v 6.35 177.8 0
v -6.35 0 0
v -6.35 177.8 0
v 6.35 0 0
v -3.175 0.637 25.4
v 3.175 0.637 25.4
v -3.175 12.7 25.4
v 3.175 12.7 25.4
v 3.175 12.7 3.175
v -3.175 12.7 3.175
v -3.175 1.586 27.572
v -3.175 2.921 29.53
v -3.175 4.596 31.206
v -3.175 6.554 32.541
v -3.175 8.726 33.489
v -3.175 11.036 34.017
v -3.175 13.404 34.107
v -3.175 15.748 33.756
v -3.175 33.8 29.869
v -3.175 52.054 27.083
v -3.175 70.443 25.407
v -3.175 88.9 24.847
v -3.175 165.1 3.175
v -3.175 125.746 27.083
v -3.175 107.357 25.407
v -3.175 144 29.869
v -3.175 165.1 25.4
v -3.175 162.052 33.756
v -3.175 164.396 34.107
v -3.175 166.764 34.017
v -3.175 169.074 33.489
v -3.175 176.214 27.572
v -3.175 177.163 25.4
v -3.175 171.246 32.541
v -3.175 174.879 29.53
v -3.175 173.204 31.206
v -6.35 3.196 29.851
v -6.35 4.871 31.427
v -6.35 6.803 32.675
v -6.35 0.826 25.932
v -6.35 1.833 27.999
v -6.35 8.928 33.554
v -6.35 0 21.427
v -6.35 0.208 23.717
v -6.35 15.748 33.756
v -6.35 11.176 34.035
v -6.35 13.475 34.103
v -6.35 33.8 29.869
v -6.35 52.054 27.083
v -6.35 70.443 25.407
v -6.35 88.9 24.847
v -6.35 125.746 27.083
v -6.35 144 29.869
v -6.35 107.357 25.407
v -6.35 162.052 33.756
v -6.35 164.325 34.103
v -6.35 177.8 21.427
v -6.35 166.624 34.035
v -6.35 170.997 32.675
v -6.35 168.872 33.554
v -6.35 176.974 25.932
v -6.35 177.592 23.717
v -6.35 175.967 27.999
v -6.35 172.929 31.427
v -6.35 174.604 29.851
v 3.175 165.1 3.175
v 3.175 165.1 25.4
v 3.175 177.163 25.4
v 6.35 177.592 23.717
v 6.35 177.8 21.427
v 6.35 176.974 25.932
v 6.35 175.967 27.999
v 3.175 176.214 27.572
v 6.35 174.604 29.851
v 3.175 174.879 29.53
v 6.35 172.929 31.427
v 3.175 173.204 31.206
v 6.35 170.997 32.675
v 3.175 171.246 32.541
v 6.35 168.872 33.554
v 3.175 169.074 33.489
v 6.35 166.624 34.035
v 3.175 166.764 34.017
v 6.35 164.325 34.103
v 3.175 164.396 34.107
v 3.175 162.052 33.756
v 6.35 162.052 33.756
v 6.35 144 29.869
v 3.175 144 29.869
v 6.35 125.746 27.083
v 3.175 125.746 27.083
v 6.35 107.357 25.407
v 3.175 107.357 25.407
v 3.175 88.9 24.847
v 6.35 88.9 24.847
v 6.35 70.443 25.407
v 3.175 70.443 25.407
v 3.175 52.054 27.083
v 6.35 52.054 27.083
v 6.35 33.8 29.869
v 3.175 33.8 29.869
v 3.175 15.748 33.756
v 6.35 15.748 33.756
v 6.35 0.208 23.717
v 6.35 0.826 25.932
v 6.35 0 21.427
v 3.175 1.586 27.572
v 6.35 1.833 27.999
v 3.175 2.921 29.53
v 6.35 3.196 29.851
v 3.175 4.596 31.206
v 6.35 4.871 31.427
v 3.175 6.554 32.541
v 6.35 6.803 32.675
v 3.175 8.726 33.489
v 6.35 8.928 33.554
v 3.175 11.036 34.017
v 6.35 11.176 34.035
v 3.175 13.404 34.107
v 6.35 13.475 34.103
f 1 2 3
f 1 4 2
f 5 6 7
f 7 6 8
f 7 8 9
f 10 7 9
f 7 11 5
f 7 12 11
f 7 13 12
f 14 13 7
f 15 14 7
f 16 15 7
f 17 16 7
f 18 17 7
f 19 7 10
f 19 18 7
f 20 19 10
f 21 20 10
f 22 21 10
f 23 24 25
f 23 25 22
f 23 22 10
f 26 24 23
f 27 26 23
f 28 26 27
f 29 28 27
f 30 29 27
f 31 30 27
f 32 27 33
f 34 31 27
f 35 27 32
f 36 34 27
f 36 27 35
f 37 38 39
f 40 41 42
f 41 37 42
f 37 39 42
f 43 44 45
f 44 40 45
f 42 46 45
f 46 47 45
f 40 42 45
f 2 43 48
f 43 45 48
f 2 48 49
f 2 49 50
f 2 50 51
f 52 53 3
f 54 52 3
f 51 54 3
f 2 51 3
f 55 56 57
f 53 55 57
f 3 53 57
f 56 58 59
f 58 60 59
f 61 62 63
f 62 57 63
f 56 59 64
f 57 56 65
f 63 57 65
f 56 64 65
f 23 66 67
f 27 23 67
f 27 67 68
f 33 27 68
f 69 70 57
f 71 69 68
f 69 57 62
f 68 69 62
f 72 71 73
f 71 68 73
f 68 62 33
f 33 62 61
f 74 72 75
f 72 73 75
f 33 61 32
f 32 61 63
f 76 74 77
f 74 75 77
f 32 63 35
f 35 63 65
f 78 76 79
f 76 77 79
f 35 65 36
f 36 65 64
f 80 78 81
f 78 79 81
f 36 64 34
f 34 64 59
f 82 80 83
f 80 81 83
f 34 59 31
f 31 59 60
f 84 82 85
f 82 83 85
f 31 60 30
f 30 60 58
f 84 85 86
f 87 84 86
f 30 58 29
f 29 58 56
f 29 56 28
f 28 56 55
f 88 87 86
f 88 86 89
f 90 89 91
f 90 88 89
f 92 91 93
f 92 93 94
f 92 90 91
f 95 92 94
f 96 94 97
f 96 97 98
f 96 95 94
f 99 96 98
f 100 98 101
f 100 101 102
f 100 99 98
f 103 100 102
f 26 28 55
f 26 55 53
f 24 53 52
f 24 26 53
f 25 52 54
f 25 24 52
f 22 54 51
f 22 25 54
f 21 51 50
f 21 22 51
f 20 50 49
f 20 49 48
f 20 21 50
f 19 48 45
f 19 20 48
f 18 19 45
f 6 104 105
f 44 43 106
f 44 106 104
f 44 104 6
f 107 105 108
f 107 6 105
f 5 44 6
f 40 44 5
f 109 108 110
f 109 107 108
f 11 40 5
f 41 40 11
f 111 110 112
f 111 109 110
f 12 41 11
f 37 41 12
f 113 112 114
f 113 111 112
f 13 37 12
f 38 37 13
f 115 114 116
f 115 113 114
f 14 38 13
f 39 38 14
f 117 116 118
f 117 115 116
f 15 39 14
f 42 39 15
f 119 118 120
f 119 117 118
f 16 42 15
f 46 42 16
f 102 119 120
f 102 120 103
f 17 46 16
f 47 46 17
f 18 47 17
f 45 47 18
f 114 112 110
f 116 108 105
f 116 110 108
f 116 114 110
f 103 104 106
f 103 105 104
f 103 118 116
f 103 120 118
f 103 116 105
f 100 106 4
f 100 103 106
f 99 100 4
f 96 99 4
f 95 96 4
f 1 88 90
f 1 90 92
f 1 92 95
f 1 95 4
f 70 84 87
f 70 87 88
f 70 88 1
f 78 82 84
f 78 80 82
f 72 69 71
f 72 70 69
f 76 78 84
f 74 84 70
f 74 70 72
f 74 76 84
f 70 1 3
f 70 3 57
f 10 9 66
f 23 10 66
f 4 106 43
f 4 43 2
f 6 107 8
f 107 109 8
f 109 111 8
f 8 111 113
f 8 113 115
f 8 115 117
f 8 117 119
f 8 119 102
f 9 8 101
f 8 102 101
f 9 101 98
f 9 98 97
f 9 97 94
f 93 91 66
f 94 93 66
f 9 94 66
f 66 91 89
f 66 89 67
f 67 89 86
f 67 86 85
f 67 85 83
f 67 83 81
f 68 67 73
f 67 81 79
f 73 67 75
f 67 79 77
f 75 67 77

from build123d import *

# Parameters (mm, degrees)
F0_W        = 152.4
F0_H        = 3.175
F1_DEPTH    = 6.35
F2_DEPTH    = 3.175
F3_T1_DEPTH = 86.5404436654
F3_T3_DEPTH = 86.5404436654


# Not quite as in the source:
# - a fillet or chamfer that OpenCascade refuses, or shapes differently, is made with other operations: its cross-section is extruded or revolved along the edge and cut away or added


with BuildPart() as f1:
    # F0 (on Right) → F1 (new body, symmetric)
    with BuildSketch(Plane.YZ):
        with Locations((88.9, 1.5875)):
            Rectangle(F0_W, F0_H)
        Polygon((0, 25.4), (0, 0), (12.7, 0), (12.7, 3.175), (12.7, 25.4), align=None)
        Polygon((165.1, 3.175), (165.1, 0), (177.8, 0), (177.8, 25.4), (165.1, 25.4), align=None)
        with BuildLine():
            Line((0, 38.1), (0, 25.4))
            Line((0, 25.4), (12.7, 25.4))
            Line((12.7, 25.4), (12.7, 3.175))
            Line((12.7, 3.175), (165.1, 3.175))
            Line((165.1, 3.175), (165.1, 25.4))
            Line((165.1, 25.4), (177.8, 25.4))
            Line((177.8, 25.4), (177.8, 38.1))
            ThreePointArc((177.8, 38.1), (88.9, 24.8473031945), (0, 38.1))
        make_face()
    extrude(amount=F1_DEPTH, both=True)

    # F0 (on Right) → F2 (cut, symmetric)
    with BuildSketch(Plane.YZ):
        with BuildLine():
            Line((0, 38.1), (0, 25.4))
            Line((0, 25.4), (12.7, 25.4))
            Line((12.7, 25.4), (12.7, 3.175))
            Line((12.7, 3.175), (165.1, 3.175))
            Line((165.1, 3.175), (165.1, 25.4))
            Line((165.1, 25.4), (177.8, 25.4))
            Line((177.8, 25.4), (177.8, 38.1))
            ThreePointArc((177.8, 38.1), (88.9, 24.8473031945), (0, 38.1))
        make_face()
    extrude(amount=F2_DEPTH, both=True, mode=Mode.SUBTRACT)

    # F3: fillet of radius 12.7 on 4 edges, made by hand

    # F3_s2 → F3_t1 (cut)
    with BuildSketch(Plane.YZ.offset(-48.0327218327)):
        with BuildLine():
            ThreePointArc((0, 21.4269112669), (4.8711942162, 31.4269012669), (15.748, 33.755726944))
            ThreePointArc((15.748, 33.755726944), (7.8448900248, 35.8223397437), (0, 38.1))
            Line((0, 38.1), (0, 21.4269112669))
        make_face()
        with BuildLine():
            ThreePointArc((177.8, 21.4269112669), (172.9288057838, 31.4269012669), (162.052, 33.755726944))
            ThreePointArc((162.052, 33.755726944), (169.9551099752, 35.8223397437), (177.8, 38.1))
            Line((177.8, 38.1), (177.8, 21.4269112669))
        make_face()
    extrude(amount=F3_T1_DEPTH, mode=Mode.SUBTRACT)

    # F3_s4 → F3_t3 (cut)
    with BuildSketch(Plane.YZ.offset(-38.5077218327)):
        with BuildLine():
            ThreePointArc((0, 21.4269112669), (4.8711942162, 31.4269012669), (15.748, 33.755726944))
            ThreePointArc((15.748, 33.755726944), (7.8448900248, 35.8223397437), (0, 38.1))
            Line((0, 38.1), (0, 21.4269112669))
        make_face()
        with BuildLine():
            ThreePointArc((177.8, 21.4269112669), (172.9288057838, 31.4269012669), (162.052, 33.755726944))
            ThreePointArc((162.052, 33.755726944), (169.9551099752, 35.8223397437), (177.8, 38.1))
            Line((177.8, 38.1), (177.8, 21.4269112669))
        make_face()
    extrude(amount=F3_T3_DEPTH, mode=Mode.SUBTRACT)


solid = f1.part
